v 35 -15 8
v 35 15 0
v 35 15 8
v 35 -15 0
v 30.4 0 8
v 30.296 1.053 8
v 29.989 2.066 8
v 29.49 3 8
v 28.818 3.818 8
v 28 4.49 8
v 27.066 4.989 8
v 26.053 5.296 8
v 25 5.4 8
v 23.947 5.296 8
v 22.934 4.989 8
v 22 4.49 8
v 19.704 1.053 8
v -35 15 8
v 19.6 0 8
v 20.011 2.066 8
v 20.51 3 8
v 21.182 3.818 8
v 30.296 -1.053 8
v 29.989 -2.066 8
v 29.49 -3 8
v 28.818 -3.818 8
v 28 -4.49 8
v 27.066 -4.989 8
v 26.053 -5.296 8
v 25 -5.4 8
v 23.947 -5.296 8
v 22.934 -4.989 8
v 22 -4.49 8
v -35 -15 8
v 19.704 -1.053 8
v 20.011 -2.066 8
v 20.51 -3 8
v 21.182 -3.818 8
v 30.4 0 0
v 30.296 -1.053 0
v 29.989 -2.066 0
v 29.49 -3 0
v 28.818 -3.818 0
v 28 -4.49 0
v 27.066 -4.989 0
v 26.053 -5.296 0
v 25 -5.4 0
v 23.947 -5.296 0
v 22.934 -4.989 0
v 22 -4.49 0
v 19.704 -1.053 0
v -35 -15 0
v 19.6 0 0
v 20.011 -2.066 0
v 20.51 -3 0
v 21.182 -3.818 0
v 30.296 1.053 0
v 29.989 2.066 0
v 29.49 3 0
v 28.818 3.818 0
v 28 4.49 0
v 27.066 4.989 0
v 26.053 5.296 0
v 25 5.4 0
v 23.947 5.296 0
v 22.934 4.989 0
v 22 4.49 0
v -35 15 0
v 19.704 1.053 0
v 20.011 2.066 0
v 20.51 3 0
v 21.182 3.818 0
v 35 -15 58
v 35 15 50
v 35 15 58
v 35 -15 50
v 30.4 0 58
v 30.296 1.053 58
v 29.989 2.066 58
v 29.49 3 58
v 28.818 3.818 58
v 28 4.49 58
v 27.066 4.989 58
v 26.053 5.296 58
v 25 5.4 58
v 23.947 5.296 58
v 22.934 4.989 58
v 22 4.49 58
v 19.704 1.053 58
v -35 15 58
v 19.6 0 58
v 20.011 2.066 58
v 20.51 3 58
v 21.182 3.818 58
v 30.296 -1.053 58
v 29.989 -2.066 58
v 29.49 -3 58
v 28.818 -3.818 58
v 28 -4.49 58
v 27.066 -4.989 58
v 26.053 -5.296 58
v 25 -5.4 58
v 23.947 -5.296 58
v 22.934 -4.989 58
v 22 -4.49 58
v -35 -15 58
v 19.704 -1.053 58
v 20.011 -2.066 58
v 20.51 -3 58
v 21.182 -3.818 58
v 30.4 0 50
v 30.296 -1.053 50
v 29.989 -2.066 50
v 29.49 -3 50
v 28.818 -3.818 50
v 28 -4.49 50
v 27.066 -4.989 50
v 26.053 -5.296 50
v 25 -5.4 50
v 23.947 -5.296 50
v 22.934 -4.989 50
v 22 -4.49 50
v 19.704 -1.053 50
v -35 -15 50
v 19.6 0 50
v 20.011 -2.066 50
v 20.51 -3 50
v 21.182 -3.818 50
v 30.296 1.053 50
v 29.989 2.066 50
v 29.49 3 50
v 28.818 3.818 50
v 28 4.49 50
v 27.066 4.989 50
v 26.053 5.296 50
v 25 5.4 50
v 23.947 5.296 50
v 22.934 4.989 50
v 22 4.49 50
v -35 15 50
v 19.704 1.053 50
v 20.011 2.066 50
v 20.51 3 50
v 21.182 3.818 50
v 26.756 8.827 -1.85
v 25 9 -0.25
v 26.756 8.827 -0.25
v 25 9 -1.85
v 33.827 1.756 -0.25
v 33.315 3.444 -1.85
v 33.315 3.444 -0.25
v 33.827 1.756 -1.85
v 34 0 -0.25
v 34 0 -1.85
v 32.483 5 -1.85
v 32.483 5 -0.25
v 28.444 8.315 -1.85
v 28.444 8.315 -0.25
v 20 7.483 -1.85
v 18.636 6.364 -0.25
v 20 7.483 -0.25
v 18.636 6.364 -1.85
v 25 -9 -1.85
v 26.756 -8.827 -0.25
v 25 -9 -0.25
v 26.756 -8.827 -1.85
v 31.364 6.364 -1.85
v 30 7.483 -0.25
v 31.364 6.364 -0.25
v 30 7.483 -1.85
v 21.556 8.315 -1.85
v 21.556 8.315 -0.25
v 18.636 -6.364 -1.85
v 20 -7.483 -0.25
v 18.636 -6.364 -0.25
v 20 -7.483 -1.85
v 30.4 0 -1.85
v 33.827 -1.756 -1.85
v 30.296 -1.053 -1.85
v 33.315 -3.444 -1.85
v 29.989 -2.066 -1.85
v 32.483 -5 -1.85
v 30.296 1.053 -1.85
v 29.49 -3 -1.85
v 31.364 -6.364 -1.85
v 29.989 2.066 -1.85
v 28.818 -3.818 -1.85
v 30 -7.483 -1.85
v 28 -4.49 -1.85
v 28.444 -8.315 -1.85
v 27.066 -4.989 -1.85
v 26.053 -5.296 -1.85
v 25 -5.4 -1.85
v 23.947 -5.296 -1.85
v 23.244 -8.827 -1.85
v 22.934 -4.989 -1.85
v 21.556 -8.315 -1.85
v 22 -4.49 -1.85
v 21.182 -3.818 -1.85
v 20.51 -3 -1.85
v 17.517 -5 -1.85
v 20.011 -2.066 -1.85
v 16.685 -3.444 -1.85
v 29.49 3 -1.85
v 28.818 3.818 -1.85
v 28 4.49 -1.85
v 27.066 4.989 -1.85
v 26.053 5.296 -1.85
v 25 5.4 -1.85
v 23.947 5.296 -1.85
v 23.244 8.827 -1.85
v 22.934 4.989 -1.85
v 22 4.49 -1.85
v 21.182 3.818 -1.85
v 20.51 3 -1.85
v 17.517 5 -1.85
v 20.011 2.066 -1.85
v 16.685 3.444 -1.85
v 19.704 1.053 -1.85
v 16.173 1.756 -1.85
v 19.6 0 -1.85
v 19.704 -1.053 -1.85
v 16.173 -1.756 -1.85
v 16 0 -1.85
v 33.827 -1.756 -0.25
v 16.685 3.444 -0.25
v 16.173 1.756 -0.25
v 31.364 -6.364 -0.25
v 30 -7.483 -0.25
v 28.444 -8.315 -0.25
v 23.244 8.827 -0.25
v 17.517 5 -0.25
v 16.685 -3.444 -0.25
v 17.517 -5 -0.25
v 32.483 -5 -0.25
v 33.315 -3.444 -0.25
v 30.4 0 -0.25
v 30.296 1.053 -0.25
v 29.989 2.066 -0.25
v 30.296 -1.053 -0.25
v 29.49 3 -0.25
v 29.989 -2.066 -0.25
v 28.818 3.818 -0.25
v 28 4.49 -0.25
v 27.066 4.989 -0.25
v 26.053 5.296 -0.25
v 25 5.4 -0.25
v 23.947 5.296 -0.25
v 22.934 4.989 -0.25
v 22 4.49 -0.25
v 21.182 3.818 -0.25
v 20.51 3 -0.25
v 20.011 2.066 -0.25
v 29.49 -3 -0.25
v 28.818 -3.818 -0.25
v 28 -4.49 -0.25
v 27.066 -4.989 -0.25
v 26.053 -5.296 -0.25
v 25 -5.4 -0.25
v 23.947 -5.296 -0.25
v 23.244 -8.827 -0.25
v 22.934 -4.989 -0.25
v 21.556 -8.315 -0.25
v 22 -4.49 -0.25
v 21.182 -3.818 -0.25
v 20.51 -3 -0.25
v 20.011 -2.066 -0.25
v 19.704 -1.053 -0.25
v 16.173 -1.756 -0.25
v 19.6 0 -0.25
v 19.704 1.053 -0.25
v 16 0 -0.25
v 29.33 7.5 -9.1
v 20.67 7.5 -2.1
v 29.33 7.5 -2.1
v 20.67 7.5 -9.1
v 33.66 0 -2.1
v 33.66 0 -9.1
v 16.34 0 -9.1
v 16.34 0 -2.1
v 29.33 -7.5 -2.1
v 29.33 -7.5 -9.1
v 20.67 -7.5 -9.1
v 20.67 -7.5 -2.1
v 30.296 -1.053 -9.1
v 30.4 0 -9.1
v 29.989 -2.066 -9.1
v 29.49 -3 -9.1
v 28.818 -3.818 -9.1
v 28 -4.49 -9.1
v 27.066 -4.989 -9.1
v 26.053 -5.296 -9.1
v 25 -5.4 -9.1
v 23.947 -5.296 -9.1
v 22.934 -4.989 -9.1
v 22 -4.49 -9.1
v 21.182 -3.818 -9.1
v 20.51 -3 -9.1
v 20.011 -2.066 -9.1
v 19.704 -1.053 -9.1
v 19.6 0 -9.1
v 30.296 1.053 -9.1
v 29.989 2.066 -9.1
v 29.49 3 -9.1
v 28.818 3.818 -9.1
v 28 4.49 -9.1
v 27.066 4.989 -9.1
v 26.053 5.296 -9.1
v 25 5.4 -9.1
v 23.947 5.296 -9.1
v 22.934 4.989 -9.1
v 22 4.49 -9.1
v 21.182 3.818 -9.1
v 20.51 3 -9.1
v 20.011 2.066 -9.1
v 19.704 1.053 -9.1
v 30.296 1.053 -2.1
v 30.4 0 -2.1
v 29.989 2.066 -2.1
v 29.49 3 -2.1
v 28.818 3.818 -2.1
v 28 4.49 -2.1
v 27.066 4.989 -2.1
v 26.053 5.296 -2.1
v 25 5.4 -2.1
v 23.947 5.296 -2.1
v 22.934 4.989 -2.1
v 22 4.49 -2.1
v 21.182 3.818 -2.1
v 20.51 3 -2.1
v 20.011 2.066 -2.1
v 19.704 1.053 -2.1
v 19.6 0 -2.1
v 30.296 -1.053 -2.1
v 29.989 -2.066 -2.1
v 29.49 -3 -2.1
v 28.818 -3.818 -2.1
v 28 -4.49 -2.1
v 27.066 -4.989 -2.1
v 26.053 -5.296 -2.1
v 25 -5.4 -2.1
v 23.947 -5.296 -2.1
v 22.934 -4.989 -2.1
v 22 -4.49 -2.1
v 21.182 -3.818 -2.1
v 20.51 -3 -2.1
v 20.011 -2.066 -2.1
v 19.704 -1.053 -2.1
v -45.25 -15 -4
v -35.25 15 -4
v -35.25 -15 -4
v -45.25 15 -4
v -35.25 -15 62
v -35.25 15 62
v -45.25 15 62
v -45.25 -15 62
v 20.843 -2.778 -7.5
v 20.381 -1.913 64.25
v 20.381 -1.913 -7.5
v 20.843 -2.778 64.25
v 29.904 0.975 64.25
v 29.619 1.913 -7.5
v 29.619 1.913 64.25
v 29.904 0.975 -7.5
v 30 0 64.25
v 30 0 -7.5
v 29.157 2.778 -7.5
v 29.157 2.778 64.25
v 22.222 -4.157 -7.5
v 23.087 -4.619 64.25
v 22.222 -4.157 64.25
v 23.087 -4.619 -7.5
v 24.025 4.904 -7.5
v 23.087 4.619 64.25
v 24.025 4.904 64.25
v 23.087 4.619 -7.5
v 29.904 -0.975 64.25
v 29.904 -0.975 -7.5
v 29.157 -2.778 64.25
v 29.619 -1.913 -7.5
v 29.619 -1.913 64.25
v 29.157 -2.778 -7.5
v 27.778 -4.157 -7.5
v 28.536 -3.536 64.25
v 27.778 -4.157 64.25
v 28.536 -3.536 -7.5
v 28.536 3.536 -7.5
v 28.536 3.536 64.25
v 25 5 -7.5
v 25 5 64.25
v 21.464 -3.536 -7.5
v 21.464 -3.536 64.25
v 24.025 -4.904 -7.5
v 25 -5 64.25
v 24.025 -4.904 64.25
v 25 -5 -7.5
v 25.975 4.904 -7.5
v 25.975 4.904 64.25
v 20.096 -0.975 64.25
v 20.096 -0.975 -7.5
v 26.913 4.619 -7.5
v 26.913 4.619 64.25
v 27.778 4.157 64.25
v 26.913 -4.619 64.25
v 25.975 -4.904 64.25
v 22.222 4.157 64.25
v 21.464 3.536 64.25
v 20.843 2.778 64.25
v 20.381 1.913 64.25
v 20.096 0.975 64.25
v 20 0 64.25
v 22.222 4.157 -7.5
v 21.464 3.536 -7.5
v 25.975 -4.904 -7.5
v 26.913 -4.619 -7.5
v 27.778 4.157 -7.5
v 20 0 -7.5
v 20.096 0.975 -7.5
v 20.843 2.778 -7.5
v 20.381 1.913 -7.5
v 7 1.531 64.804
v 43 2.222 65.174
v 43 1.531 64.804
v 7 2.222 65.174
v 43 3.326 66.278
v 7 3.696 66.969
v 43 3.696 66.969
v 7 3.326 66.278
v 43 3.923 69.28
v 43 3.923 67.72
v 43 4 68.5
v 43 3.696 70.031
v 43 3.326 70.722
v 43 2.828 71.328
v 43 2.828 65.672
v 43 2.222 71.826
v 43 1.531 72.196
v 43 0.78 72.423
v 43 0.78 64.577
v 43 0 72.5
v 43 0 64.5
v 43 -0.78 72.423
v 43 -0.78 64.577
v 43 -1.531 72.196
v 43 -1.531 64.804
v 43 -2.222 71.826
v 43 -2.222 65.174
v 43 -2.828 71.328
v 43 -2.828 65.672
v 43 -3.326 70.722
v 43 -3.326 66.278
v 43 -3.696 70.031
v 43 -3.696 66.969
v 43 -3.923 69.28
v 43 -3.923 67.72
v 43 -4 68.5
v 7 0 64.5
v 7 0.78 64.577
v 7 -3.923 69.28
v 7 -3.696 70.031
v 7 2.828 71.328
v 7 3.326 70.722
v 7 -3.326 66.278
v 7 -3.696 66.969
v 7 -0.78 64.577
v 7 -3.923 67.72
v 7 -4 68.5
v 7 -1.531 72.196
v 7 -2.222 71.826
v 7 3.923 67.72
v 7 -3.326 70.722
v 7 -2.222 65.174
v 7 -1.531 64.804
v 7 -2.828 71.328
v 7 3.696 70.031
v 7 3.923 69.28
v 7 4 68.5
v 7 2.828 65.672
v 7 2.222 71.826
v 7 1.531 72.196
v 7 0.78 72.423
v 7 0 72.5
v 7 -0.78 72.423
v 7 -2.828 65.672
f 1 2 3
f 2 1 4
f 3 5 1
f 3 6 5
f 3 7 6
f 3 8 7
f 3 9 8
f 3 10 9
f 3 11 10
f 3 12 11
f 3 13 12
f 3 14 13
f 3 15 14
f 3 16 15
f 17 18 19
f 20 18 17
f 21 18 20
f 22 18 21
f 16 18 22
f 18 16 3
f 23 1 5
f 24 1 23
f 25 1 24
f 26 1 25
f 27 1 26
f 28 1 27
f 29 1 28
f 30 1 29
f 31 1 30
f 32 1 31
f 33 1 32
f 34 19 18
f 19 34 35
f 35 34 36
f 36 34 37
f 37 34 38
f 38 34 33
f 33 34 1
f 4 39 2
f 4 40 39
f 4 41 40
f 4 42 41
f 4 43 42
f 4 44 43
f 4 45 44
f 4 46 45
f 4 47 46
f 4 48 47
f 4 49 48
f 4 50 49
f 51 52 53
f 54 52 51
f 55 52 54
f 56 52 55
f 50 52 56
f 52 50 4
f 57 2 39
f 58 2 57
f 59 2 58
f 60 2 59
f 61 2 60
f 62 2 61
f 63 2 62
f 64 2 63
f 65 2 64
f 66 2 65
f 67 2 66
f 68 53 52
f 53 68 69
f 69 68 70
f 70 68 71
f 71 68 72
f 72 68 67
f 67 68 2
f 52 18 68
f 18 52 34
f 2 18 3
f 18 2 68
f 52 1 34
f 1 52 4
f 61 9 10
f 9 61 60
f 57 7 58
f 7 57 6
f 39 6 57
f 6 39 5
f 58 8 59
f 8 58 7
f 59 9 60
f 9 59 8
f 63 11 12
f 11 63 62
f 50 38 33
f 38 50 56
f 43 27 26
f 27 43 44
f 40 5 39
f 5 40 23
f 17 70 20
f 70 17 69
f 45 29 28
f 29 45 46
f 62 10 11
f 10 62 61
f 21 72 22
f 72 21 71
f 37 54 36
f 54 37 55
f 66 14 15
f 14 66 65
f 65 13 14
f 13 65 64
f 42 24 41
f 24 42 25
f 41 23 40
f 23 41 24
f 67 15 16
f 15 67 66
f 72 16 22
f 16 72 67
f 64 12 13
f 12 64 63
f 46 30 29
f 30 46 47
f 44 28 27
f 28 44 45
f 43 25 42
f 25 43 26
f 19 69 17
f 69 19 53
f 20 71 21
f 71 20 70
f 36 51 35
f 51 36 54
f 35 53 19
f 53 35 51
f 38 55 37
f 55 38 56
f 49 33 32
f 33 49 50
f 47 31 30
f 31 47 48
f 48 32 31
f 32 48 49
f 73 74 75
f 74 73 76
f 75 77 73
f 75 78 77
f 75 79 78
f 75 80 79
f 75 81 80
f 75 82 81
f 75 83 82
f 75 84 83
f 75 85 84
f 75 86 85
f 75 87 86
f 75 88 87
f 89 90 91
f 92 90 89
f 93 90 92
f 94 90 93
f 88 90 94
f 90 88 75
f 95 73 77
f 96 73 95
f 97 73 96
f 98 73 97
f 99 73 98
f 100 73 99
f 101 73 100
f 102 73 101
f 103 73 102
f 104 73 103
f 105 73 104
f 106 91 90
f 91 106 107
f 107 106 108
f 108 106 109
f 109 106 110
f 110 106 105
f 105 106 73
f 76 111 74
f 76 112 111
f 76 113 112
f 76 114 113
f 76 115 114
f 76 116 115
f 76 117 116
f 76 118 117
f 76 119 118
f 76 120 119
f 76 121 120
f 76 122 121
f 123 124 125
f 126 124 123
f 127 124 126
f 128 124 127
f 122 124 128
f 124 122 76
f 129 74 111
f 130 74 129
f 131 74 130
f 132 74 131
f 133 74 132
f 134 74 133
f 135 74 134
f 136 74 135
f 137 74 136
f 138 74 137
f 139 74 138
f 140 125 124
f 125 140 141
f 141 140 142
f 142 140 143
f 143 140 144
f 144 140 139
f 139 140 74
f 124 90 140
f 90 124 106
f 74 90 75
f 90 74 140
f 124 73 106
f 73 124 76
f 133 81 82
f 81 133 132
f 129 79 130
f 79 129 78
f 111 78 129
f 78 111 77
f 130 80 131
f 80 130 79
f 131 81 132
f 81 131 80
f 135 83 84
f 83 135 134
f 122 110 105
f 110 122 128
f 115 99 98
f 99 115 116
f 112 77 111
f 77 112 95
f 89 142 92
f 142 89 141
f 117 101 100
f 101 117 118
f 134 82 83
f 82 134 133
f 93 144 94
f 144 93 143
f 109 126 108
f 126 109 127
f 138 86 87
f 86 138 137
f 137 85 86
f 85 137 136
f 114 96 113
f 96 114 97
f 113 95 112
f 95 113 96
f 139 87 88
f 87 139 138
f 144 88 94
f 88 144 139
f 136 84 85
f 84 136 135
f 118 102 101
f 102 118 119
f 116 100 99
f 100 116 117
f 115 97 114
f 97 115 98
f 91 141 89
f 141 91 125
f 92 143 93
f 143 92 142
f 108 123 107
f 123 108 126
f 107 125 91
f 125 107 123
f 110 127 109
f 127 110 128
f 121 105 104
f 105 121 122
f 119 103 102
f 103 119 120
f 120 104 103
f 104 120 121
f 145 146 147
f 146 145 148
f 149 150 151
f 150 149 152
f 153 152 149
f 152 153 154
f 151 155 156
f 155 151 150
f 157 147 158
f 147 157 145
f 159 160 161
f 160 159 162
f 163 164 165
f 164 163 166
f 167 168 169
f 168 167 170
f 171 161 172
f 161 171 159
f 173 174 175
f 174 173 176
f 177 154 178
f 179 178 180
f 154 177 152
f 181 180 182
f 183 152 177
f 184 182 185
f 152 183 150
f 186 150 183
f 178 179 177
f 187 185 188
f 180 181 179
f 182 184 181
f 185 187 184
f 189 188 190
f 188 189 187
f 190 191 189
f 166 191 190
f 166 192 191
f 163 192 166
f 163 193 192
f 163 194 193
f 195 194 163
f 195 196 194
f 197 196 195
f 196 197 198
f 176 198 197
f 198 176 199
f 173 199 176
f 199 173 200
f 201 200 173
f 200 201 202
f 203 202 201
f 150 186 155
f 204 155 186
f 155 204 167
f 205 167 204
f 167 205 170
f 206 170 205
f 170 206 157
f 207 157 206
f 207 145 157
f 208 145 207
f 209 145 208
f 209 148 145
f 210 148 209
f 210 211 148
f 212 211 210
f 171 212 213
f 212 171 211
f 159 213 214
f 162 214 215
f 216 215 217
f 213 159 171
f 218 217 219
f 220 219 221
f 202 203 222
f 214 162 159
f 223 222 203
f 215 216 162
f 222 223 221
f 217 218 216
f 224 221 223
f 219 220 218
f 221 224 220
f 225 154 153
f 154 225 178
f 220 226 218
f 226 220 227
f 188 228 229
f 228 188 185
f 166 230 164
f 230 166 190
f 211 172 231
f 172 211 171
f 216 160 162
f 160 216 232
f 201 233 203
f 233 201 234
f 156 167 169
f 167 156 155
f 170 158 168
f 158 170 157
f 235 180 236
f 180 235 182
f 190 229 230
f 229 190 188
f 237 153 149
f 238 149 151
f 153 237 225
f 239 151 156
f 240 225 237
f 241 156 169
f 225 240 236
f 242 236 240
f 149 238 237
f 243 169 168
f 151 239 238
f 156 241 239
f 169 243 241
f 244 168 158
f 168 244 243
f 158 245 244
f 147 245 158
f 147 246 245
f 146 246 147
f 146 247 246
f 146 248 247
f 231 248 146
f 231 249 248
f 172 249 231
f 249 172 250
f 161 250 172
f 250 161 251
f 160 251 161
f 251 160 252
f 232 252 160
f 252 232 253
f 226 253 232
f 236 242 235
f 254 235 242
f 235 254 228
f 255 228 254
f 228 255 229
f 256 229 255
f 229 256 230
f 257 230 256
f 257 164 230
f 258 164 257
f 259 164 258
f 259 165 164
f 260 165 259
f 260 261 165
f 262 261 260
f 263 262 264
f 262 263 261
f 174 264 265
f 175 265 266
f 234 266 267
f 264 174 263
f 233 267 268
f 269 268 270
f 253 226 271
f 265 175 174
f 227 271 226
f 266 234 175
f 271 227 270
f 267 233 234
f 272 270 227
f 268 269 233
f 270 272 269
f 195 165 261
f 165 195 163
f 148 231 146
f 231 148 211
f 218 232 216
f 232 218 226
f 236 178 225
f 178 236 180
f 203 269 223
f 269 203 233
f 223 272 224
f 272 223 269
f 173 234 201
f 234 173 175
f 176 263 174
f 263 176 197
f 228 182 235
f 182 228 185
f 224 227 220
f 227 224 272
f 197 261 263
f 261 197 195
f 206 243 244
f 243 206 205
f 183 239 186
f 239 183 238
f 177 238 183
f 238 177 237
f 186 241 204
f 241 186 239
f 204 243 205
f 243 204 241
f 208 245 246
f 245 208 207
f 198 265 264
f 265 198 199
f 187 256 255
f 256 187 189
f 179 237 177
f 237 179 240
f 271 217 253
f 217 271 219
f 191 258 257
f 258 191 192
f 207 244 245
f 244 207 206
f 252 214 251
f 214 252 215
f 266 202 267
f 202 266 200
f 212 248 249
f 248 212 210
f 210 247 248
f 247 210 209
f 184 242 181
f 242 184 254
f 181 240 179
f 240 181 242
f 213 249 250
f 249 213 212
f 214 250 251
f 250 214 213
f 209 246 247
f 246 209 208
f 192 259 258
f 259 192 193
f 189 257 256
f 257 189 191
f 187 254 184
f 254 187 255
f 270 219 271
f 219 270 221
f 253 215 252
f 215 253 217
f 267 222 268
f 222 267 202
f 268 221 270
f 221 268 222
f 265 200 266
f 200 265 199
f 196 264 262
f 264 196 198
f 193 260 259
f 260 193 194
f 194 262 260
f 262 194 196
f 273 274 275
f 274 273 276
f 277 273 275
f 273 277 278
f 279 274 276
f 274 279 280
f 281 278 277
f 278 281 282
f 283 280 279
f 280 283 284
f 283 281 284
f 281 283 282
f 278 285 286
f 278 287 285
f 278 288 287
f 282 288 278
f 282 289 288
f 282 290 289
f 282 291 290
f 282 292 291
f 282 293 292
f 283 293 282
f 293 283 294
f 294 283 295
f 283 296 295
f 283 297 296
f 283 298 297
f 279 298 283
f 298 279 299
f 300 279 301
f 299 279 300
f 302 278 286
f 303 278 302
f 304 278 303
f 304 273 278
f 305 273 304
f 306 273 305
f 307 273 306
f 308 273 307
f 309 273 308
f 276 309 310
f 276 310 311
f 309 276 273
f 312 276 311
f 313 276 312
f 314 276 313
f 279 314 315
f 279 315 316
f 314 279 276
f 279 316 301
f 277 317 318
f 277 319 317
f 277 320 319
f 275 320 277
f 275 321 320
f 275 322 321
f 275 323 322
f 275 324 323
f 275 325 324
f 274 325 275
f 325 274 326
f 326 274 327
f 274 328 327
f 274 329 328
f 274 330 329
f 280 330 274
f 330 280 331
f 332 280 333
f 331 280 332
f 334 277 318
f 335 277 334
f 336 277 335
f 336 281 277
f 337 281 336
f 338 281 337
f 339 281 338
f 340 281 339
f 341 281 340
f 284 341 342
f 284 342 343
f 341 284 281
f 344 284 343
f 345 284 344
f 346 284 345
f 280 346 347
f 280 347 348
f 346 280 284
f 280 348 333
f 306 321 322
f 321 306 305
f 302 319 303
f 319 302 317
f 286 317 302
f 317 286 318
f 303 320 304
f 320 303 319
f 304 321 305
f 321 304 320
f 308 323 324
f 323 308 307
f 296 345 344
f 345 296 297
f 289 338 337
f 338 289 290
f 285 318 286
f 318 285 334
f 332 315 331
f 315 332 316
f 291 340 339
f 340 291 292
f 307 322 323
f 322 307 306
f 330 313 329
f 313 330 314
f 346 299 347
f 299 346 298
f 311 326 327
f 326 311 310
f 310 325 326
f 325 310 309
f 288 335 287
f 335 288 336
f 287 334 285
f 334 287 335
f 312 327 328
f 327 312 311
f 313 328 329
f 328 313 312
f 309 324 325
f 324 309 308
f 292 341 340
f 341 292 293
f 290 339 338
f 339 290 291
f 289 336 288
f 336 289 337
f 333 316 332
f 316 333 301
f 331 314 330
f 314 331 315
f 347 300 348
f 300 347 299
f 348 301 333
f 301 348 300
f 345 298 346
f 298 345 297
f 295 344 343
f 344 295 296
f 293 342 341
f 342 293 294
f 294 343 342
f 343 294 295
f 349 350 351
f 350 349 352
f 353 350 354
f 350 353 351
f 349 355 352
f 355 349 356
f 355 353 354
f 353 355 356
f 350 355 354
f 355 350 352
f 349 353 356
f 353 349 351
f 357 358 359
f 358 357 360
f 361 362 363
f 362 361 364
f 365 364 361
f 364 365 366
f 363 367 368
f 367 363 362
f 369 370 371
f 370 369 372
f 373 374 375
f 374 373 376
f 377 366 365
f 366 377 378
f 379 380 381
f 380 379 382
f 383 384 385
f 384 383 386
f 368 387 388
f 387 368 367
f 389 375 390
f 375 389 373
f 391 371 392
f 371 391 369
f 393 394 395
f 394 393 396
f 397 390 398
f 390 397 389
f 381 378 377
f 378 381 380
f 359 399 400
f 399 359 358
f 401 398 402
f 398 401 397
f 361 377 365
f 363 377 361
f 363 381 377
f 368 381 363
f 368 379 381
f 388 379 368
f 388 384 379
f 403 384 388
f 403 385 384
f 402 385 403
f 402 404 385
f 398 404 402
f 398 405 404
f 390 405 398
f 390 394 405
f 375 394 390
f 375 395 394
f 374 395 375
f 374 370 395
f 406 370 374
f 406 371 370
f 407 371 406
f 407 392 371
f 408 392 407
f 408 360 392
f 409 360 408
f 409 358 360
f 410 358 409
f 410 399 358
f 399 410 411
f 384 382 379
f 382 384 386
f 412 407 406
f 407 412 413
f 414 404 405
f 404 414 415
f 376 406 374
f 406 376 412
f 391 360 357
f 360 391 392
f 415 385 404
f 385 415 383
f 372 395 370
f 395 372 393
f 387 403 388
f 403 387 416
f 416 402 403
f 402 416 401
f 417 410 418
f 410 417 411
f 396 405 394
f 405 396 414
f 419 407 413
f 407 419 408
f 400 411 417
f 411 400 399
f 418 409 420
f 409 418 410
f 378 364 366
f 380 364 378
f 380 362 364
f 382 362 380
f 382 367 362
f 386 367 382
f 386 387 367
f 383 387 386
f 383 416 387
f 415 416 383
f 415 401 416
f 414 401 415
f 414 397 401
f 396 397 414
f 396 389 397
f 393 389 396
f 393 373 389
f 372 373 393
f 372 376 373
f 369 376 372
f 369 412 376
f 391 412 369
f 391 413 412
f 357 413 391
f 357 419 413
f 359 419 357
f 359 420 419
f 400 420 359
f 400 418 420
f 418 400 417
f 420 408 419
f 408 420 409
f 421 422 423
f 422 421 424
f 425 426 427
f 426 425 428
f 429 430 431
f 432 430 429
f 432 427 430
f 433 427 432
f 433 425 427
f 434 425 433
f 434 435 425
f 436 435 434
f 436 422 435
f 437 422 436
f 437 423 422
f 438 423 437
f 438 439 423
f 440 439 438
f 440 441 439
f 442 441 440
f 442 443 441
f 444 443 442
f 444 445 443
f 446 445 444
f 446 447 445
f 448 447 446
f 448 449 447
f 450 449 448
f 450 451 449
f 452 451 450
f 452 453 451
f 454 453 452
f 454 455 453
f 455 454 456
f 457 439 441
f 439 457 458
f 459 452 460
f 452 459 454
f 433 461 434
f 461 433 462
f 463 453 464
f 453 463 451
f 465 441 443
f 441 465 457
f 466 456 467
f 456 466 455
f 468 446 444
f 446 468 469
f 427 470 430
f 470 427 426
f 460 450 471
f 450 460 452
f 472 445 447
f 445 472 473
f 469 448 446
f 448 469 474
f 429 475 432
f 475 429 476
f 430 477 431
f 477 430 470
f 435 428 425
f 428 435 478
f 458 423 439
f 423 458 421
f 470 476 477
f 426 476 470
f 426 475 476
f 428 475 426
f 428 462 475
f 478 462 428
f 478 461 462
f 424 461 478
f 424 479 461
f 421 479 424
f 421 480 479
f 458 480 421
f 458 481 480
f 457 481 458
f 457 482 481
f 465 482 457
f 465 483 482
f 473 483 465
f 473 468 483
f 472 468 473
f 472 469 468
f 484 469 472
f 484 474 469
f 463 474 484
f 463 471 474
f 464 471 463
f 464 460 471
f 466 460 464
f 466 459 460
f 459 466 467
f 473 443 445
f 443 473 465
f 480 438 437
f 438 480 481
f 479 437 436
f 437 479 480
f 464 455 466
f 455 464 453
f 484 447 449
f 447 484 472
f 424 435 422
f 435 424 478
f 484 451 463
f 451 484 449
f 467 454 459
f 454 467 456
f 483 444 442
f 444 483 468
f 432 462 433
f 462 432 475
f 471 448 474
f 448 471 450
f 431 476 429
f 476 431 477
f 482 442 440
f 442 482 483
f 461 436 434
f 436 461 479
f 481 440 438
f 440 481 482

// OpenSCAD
$fn = 32;

// ------------------------------------------------------------------------
// C clamp: throat 50 mm, screw d10
// Every part is its own module, assembly() places every instance.
// ------------------------------------------------------------------------

// --- part 1 ---
module clamp_arm() {
  difference() {
    translate([-35, -15, 0]) cube([70, 30, 8]);
    translate([25, 0, -1]) cylinder(h = 10, d = 10.8);
  }
}

// --- part 2 ---
module clamp_spine() {
  difference() {
    translate([-33, -15, 0]) cube([66, 30, 10]);
  }
}

// --- part 3 ---
module clamp_screw() {
  translate([0, 0, -35.875]) cylinder(h = 71.75, d = 10);
}

// --- part 4 ---
module clamp_washer() {
  difference() {
      translate([0, 0, 0]) cylinder(h = 1.6, d = 18);
      translate([0, 0, -1]) cylinder(h = 3.6, d = 10.8);
    }
}

// --- part 5 ---
module clamp_nut() {
  difference() {
    linear_extrude(height = 7) polygon(points = [[8.66, 0], [4.33, 7.5], [-4.33, 7.5], [-8.66, 0], [-4.33, -7.5], [4.33, -7.5]]);
    translate([0, 0, -1]) cylinder(h = 9, d = 10.8);
  }
}

// --- part 6 ---
module tommy_bar() {
  translate([0, 0, -18]) cylinder(h = 36, d = 8);
}

// --- assembly ---
module assembly() {
  color([0.80, 0.24, 0.20]) translate([0, 0, 0]) rotate([0, 0, 0]) clamp_arm();
  color([0.20, 0.45, 0.75]) translate([0, 0, 50]) rotate([0, 0, 0]) clamp_arm();
  color([0.25, 0.62, 0.32]) translate([-45.25, 0, 29]) rotate([0, 90, 0]) clamp_spine();
  color([0.92, 0.70, 0.18]) translate([25, 0, 28.375]) rotate([0, 0, 0]) clamp_screw();
  color([0.58, 0.35, 0.70]) translate([25, 0, -1.85]) rotate([0, 0, 0]) clamp_washer();
  color([0.16, 0.66, 0.66]) translate([25, 0, -9.1]) rotate([0, 0, 0]) clamp_nut();
  color([0.85, 0.48, 0.18]) translate([25, 0, 68.5]) rotate([0, 90, 0]) tommy_bar();
}

assembly();
